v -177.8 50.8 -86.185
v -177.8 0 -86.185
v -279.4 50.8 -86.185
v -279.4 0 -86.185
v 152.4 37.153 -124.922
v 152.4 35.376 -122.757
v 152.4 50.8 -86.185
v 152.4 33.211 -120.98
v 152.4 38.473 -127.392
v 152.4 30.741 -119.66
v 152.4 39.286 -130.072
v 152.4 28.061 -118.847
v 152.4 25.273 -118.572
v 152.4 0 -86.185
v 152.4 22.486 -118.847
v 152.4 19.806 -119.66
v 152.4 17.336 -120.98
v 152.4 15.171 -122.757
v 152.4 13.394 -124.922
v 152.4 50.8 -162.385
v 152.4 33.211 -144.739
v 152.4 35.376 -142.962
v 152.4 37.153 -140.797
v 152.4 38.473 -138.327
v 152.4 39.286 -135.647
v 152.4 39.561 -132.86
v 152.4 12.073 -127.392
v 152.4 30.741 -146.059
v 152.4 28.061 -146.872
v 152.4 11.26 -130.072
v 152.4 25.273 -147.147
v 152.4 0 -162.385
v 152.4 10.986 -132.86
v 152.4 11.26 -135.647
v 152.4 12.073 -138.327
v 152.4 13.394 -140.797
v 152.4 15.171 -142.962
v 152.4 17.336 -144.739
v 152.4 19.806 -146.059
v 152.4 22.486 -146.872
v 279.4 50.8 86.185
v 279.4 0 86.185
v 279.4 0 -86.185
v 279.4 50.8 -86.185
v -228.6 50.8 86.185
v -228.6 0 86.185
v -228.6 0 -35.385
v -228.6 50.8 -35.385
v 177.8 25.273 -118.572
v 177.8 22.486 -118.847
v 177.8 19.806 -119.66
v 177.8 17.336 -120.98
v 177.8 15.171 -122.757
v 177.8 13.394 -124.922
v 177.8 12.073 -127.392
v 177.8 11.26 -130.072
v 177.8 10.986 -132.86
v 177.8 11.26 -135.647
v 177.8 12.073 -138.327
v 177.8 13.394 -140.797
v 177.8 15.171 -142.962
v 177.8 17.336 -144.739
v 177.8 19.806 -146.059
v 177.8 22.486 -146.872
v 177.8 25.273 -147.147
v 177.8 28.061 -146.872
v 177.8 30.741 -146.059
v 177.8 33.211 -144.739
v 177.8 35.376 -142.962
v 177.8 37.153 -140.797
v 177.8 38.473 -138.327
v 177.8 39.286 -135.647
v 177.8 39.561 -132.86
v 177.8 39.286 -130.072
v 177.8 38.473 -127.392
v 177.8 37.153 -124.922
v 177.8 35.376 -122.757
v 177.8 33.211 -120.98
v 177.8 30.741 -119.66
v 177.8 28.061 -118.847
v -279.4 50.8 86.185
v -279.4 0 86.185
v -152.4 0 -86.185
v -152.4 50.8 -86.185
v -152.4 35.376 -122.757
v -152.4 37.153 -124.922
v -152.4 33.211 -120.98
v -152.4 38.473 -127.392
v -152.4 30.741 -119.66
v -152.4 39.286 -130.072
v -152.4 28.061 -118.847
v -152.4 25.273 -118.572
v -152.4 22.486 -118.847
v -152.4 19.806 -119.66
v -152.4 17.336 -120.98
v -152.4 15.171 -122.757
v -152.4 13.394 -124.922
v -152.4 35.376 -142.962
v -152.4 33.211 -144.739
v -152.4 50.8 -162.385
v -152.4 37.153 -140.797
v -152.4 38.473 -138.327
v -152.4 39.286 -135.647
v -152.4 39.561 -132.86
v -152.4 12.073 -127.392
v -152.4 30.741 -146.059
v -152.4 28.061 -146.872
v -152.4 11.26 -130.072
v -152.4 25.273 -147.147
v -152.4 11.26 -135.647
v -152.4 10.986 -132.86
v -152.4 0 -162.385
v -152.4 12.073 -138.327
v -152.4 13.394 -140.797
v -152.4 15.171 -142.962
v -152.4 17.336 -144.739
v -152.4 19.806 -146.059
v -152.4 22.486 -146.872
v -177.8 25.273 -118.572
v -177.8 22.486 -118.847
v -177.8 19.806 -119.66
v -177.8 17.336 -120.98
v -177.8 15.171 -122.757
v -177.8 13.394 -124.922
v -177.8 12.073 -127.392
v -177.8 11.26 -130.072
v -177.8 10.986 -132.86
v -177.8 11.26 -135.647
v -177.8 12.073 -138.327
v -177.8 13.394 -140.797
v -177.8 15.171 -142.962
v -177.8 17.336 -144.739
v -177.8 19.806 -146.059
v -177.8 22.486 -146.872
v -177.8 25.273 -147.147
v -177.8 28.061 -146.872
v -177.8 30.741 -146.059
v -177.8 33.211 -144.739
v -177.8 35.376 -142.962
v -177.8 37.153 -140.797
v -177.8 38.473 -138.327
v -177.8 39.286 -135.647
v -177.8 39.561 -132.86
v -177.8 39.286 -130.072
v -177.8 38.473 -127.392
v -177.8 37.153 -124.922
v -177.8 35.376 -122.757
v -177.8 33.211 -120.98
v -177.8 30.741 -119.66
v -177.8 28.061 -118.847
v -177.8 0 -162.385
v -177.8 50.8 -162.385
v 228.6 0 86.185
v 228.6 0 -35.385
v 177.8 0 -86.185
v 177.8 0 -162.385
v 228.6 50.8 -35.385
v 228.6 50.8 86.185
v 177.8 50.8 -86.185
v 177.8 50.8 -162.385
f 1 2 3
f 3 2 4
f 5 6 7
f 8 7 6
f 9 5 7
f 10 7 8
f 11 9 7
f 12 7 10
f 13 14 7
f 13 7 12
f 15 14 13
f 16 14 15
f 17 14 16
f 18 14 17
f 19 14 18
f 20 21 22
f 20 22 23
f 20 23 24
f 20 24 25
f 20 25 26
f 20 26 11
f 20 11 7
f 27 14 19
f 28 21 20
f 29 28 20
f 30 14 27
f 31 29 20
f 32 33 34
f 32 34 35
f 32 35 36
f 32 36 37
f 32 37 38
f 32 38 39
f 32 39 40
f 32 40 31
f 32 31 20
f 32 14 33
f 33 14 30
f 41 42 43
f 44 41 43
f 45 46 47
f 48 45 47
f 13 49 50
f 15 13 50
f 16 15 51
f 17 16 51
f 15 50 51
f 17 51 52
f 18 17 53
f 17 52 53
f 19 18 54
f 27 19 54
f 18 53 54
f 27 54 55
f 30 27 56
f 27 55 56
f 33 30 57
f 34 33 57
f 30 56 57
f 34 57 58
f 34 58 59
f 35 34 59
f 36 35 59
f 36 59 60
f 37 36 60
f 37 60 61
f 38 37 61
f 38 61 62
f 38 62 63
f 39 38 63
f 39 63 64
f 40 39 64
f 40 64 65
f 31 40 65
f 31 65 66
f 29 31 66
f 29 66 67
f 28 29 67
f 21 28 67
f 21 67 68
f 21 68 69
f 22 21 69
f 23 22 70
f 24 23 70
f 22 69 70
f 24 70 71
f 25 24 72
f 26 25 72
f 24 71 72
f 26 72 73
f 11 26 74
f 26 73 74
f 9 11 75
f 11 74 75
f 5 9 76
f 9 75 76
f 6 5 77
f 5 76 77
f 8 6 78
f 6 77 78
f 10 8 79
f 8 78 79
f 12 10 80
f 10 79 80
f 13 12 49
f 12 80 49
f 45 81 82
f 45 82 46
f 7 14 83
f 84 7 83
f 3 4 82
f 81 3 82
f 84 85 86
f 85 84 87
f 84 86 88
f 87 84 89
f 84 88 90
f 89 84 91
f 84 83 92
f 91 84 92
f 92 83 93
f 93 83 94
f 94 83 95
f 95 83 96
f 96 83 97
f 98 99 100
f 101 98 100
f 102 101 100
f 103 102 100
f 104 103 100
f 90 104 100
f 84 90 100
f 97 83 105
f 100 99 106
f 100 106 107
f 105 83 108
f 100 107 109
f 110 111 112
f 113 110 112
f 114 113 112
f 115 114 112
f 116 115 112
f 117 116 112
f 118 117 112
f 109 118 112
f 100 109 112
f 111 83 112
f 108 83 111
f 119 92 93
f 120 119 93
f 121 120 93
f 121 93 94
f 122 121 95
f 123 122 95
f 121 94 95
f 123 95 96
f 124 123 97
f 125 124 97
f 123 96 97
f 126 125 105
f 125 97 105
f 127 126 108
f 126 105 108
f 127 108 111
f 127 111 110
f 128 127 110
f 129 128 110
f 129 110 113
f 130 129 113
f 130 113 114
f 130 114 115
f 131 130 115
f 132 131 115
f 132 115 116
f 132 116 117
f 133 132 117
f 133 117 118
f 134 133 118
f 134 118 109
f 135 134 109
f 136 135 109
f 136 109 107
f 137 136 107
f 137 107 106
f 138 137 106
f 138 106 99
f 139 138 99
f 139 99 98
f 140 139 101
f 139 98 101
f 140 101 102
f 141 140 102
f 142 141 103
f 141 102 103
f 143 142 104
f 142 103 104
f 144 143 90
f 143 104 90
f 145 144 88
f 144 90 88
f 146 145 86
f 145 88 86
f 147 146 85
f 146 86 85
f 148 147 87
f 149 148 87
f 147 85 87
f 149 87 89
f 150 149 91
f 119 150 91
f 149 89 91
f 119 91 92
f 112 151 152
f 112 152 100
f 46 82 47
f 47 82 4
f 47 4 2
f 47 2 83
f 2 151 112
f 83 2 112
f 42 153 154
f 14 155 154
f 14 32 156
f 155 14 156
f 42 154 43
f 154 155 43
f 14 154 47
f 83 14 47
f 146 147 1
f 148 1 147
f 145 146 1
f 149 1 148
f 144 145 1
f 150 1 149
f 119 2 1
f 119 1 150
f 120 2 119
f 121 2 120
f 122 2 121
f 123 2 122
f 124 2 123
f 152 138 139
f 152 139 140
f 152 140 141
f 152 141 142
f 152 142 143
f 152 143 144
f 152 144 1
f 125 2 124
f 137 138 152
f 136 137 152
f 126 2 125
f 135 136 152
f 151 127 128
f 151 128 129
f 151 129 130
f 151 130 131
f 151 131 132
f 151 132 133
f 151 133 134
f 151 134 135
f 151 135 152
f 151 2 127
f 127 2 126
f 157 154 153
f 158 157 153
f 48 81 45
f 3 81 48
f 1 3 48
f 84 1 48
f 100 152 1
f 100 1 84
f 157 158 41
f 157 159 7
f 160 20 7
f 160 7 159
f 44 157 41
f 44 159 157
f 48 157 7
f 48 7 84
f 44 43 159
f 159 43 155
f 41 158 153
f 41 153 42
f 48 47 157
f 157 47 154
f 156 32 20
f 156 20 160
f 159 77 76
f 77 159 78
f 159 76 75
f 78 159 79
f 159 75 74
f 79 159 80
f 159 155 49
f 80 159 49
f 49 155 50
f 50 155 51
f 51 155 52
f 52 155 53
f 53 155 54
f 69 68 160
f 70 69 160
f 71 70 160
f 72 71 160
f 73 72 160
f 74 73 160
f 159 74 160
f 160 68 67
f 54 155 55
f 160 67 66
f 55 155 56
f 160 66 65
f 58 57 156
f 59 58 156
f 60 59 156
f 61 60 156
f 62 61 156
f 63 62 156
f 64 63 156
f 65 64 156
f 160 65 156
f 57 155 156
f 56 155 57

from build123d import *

# Parameters (mm, degrees)
SKETCH1_W           = 25.4
SKETCH1_H           = 76.2
BOSS_EXTRUDE1_DEPTH = 50.8
SKETCH2_R           = 14.2875
CUT_EXTRUDE1_DEPTH  = 488.833224229


with BuildPart() as part:
    # Sketch1 → Boss-Extrude1 (new body)
    with BuildSketch(Plane(origin=(0, 0, 0), x_dir=(1, 0, 0), z_dir=(0, 1, 0))):
        Polygon((-279.4, 86.184650326), (-279.4, -86.184650326), (-228.6, -86.184650326), (-228.6, 35.384650326), (228.6, 35.384650326), (228.6, -86.184650326), (279.4, -86.184650326), (279.4, 86.184650326), (177.8, 86.184650326), (152.4, 86.184650326), (-152.4, 86.184650326), (-177.8, 86.184650326), align=None)
        with Locations((-165.1, 124.284650326)):
            Rectangle(SKETCH1_W, SKETCH1_H)
        with Locations((165.1, 124.284650326)):
            Rectangle(SKETCH1_W, SKETCH1_H)
    extrude(amount=BOSS_EXTRUDE1_DEPTH)

    # Sketch2 → Cut-Extrude1 (cut, through all)
    with BuildSketch(Plane(origin=(177.8, 0, 0), x_dir=(0, 0, -1), z_dir=(1, 0, 0))):
        with Locations(Location((132.85952271, 25.273316146, 0), (0, 0, 180))):
            Circle(SKETCH2_R)
    extrude(amount=-CUT_EXTRUDE1_DEPTH, mode=Mode.SUBTRACT)


solid = part.part
